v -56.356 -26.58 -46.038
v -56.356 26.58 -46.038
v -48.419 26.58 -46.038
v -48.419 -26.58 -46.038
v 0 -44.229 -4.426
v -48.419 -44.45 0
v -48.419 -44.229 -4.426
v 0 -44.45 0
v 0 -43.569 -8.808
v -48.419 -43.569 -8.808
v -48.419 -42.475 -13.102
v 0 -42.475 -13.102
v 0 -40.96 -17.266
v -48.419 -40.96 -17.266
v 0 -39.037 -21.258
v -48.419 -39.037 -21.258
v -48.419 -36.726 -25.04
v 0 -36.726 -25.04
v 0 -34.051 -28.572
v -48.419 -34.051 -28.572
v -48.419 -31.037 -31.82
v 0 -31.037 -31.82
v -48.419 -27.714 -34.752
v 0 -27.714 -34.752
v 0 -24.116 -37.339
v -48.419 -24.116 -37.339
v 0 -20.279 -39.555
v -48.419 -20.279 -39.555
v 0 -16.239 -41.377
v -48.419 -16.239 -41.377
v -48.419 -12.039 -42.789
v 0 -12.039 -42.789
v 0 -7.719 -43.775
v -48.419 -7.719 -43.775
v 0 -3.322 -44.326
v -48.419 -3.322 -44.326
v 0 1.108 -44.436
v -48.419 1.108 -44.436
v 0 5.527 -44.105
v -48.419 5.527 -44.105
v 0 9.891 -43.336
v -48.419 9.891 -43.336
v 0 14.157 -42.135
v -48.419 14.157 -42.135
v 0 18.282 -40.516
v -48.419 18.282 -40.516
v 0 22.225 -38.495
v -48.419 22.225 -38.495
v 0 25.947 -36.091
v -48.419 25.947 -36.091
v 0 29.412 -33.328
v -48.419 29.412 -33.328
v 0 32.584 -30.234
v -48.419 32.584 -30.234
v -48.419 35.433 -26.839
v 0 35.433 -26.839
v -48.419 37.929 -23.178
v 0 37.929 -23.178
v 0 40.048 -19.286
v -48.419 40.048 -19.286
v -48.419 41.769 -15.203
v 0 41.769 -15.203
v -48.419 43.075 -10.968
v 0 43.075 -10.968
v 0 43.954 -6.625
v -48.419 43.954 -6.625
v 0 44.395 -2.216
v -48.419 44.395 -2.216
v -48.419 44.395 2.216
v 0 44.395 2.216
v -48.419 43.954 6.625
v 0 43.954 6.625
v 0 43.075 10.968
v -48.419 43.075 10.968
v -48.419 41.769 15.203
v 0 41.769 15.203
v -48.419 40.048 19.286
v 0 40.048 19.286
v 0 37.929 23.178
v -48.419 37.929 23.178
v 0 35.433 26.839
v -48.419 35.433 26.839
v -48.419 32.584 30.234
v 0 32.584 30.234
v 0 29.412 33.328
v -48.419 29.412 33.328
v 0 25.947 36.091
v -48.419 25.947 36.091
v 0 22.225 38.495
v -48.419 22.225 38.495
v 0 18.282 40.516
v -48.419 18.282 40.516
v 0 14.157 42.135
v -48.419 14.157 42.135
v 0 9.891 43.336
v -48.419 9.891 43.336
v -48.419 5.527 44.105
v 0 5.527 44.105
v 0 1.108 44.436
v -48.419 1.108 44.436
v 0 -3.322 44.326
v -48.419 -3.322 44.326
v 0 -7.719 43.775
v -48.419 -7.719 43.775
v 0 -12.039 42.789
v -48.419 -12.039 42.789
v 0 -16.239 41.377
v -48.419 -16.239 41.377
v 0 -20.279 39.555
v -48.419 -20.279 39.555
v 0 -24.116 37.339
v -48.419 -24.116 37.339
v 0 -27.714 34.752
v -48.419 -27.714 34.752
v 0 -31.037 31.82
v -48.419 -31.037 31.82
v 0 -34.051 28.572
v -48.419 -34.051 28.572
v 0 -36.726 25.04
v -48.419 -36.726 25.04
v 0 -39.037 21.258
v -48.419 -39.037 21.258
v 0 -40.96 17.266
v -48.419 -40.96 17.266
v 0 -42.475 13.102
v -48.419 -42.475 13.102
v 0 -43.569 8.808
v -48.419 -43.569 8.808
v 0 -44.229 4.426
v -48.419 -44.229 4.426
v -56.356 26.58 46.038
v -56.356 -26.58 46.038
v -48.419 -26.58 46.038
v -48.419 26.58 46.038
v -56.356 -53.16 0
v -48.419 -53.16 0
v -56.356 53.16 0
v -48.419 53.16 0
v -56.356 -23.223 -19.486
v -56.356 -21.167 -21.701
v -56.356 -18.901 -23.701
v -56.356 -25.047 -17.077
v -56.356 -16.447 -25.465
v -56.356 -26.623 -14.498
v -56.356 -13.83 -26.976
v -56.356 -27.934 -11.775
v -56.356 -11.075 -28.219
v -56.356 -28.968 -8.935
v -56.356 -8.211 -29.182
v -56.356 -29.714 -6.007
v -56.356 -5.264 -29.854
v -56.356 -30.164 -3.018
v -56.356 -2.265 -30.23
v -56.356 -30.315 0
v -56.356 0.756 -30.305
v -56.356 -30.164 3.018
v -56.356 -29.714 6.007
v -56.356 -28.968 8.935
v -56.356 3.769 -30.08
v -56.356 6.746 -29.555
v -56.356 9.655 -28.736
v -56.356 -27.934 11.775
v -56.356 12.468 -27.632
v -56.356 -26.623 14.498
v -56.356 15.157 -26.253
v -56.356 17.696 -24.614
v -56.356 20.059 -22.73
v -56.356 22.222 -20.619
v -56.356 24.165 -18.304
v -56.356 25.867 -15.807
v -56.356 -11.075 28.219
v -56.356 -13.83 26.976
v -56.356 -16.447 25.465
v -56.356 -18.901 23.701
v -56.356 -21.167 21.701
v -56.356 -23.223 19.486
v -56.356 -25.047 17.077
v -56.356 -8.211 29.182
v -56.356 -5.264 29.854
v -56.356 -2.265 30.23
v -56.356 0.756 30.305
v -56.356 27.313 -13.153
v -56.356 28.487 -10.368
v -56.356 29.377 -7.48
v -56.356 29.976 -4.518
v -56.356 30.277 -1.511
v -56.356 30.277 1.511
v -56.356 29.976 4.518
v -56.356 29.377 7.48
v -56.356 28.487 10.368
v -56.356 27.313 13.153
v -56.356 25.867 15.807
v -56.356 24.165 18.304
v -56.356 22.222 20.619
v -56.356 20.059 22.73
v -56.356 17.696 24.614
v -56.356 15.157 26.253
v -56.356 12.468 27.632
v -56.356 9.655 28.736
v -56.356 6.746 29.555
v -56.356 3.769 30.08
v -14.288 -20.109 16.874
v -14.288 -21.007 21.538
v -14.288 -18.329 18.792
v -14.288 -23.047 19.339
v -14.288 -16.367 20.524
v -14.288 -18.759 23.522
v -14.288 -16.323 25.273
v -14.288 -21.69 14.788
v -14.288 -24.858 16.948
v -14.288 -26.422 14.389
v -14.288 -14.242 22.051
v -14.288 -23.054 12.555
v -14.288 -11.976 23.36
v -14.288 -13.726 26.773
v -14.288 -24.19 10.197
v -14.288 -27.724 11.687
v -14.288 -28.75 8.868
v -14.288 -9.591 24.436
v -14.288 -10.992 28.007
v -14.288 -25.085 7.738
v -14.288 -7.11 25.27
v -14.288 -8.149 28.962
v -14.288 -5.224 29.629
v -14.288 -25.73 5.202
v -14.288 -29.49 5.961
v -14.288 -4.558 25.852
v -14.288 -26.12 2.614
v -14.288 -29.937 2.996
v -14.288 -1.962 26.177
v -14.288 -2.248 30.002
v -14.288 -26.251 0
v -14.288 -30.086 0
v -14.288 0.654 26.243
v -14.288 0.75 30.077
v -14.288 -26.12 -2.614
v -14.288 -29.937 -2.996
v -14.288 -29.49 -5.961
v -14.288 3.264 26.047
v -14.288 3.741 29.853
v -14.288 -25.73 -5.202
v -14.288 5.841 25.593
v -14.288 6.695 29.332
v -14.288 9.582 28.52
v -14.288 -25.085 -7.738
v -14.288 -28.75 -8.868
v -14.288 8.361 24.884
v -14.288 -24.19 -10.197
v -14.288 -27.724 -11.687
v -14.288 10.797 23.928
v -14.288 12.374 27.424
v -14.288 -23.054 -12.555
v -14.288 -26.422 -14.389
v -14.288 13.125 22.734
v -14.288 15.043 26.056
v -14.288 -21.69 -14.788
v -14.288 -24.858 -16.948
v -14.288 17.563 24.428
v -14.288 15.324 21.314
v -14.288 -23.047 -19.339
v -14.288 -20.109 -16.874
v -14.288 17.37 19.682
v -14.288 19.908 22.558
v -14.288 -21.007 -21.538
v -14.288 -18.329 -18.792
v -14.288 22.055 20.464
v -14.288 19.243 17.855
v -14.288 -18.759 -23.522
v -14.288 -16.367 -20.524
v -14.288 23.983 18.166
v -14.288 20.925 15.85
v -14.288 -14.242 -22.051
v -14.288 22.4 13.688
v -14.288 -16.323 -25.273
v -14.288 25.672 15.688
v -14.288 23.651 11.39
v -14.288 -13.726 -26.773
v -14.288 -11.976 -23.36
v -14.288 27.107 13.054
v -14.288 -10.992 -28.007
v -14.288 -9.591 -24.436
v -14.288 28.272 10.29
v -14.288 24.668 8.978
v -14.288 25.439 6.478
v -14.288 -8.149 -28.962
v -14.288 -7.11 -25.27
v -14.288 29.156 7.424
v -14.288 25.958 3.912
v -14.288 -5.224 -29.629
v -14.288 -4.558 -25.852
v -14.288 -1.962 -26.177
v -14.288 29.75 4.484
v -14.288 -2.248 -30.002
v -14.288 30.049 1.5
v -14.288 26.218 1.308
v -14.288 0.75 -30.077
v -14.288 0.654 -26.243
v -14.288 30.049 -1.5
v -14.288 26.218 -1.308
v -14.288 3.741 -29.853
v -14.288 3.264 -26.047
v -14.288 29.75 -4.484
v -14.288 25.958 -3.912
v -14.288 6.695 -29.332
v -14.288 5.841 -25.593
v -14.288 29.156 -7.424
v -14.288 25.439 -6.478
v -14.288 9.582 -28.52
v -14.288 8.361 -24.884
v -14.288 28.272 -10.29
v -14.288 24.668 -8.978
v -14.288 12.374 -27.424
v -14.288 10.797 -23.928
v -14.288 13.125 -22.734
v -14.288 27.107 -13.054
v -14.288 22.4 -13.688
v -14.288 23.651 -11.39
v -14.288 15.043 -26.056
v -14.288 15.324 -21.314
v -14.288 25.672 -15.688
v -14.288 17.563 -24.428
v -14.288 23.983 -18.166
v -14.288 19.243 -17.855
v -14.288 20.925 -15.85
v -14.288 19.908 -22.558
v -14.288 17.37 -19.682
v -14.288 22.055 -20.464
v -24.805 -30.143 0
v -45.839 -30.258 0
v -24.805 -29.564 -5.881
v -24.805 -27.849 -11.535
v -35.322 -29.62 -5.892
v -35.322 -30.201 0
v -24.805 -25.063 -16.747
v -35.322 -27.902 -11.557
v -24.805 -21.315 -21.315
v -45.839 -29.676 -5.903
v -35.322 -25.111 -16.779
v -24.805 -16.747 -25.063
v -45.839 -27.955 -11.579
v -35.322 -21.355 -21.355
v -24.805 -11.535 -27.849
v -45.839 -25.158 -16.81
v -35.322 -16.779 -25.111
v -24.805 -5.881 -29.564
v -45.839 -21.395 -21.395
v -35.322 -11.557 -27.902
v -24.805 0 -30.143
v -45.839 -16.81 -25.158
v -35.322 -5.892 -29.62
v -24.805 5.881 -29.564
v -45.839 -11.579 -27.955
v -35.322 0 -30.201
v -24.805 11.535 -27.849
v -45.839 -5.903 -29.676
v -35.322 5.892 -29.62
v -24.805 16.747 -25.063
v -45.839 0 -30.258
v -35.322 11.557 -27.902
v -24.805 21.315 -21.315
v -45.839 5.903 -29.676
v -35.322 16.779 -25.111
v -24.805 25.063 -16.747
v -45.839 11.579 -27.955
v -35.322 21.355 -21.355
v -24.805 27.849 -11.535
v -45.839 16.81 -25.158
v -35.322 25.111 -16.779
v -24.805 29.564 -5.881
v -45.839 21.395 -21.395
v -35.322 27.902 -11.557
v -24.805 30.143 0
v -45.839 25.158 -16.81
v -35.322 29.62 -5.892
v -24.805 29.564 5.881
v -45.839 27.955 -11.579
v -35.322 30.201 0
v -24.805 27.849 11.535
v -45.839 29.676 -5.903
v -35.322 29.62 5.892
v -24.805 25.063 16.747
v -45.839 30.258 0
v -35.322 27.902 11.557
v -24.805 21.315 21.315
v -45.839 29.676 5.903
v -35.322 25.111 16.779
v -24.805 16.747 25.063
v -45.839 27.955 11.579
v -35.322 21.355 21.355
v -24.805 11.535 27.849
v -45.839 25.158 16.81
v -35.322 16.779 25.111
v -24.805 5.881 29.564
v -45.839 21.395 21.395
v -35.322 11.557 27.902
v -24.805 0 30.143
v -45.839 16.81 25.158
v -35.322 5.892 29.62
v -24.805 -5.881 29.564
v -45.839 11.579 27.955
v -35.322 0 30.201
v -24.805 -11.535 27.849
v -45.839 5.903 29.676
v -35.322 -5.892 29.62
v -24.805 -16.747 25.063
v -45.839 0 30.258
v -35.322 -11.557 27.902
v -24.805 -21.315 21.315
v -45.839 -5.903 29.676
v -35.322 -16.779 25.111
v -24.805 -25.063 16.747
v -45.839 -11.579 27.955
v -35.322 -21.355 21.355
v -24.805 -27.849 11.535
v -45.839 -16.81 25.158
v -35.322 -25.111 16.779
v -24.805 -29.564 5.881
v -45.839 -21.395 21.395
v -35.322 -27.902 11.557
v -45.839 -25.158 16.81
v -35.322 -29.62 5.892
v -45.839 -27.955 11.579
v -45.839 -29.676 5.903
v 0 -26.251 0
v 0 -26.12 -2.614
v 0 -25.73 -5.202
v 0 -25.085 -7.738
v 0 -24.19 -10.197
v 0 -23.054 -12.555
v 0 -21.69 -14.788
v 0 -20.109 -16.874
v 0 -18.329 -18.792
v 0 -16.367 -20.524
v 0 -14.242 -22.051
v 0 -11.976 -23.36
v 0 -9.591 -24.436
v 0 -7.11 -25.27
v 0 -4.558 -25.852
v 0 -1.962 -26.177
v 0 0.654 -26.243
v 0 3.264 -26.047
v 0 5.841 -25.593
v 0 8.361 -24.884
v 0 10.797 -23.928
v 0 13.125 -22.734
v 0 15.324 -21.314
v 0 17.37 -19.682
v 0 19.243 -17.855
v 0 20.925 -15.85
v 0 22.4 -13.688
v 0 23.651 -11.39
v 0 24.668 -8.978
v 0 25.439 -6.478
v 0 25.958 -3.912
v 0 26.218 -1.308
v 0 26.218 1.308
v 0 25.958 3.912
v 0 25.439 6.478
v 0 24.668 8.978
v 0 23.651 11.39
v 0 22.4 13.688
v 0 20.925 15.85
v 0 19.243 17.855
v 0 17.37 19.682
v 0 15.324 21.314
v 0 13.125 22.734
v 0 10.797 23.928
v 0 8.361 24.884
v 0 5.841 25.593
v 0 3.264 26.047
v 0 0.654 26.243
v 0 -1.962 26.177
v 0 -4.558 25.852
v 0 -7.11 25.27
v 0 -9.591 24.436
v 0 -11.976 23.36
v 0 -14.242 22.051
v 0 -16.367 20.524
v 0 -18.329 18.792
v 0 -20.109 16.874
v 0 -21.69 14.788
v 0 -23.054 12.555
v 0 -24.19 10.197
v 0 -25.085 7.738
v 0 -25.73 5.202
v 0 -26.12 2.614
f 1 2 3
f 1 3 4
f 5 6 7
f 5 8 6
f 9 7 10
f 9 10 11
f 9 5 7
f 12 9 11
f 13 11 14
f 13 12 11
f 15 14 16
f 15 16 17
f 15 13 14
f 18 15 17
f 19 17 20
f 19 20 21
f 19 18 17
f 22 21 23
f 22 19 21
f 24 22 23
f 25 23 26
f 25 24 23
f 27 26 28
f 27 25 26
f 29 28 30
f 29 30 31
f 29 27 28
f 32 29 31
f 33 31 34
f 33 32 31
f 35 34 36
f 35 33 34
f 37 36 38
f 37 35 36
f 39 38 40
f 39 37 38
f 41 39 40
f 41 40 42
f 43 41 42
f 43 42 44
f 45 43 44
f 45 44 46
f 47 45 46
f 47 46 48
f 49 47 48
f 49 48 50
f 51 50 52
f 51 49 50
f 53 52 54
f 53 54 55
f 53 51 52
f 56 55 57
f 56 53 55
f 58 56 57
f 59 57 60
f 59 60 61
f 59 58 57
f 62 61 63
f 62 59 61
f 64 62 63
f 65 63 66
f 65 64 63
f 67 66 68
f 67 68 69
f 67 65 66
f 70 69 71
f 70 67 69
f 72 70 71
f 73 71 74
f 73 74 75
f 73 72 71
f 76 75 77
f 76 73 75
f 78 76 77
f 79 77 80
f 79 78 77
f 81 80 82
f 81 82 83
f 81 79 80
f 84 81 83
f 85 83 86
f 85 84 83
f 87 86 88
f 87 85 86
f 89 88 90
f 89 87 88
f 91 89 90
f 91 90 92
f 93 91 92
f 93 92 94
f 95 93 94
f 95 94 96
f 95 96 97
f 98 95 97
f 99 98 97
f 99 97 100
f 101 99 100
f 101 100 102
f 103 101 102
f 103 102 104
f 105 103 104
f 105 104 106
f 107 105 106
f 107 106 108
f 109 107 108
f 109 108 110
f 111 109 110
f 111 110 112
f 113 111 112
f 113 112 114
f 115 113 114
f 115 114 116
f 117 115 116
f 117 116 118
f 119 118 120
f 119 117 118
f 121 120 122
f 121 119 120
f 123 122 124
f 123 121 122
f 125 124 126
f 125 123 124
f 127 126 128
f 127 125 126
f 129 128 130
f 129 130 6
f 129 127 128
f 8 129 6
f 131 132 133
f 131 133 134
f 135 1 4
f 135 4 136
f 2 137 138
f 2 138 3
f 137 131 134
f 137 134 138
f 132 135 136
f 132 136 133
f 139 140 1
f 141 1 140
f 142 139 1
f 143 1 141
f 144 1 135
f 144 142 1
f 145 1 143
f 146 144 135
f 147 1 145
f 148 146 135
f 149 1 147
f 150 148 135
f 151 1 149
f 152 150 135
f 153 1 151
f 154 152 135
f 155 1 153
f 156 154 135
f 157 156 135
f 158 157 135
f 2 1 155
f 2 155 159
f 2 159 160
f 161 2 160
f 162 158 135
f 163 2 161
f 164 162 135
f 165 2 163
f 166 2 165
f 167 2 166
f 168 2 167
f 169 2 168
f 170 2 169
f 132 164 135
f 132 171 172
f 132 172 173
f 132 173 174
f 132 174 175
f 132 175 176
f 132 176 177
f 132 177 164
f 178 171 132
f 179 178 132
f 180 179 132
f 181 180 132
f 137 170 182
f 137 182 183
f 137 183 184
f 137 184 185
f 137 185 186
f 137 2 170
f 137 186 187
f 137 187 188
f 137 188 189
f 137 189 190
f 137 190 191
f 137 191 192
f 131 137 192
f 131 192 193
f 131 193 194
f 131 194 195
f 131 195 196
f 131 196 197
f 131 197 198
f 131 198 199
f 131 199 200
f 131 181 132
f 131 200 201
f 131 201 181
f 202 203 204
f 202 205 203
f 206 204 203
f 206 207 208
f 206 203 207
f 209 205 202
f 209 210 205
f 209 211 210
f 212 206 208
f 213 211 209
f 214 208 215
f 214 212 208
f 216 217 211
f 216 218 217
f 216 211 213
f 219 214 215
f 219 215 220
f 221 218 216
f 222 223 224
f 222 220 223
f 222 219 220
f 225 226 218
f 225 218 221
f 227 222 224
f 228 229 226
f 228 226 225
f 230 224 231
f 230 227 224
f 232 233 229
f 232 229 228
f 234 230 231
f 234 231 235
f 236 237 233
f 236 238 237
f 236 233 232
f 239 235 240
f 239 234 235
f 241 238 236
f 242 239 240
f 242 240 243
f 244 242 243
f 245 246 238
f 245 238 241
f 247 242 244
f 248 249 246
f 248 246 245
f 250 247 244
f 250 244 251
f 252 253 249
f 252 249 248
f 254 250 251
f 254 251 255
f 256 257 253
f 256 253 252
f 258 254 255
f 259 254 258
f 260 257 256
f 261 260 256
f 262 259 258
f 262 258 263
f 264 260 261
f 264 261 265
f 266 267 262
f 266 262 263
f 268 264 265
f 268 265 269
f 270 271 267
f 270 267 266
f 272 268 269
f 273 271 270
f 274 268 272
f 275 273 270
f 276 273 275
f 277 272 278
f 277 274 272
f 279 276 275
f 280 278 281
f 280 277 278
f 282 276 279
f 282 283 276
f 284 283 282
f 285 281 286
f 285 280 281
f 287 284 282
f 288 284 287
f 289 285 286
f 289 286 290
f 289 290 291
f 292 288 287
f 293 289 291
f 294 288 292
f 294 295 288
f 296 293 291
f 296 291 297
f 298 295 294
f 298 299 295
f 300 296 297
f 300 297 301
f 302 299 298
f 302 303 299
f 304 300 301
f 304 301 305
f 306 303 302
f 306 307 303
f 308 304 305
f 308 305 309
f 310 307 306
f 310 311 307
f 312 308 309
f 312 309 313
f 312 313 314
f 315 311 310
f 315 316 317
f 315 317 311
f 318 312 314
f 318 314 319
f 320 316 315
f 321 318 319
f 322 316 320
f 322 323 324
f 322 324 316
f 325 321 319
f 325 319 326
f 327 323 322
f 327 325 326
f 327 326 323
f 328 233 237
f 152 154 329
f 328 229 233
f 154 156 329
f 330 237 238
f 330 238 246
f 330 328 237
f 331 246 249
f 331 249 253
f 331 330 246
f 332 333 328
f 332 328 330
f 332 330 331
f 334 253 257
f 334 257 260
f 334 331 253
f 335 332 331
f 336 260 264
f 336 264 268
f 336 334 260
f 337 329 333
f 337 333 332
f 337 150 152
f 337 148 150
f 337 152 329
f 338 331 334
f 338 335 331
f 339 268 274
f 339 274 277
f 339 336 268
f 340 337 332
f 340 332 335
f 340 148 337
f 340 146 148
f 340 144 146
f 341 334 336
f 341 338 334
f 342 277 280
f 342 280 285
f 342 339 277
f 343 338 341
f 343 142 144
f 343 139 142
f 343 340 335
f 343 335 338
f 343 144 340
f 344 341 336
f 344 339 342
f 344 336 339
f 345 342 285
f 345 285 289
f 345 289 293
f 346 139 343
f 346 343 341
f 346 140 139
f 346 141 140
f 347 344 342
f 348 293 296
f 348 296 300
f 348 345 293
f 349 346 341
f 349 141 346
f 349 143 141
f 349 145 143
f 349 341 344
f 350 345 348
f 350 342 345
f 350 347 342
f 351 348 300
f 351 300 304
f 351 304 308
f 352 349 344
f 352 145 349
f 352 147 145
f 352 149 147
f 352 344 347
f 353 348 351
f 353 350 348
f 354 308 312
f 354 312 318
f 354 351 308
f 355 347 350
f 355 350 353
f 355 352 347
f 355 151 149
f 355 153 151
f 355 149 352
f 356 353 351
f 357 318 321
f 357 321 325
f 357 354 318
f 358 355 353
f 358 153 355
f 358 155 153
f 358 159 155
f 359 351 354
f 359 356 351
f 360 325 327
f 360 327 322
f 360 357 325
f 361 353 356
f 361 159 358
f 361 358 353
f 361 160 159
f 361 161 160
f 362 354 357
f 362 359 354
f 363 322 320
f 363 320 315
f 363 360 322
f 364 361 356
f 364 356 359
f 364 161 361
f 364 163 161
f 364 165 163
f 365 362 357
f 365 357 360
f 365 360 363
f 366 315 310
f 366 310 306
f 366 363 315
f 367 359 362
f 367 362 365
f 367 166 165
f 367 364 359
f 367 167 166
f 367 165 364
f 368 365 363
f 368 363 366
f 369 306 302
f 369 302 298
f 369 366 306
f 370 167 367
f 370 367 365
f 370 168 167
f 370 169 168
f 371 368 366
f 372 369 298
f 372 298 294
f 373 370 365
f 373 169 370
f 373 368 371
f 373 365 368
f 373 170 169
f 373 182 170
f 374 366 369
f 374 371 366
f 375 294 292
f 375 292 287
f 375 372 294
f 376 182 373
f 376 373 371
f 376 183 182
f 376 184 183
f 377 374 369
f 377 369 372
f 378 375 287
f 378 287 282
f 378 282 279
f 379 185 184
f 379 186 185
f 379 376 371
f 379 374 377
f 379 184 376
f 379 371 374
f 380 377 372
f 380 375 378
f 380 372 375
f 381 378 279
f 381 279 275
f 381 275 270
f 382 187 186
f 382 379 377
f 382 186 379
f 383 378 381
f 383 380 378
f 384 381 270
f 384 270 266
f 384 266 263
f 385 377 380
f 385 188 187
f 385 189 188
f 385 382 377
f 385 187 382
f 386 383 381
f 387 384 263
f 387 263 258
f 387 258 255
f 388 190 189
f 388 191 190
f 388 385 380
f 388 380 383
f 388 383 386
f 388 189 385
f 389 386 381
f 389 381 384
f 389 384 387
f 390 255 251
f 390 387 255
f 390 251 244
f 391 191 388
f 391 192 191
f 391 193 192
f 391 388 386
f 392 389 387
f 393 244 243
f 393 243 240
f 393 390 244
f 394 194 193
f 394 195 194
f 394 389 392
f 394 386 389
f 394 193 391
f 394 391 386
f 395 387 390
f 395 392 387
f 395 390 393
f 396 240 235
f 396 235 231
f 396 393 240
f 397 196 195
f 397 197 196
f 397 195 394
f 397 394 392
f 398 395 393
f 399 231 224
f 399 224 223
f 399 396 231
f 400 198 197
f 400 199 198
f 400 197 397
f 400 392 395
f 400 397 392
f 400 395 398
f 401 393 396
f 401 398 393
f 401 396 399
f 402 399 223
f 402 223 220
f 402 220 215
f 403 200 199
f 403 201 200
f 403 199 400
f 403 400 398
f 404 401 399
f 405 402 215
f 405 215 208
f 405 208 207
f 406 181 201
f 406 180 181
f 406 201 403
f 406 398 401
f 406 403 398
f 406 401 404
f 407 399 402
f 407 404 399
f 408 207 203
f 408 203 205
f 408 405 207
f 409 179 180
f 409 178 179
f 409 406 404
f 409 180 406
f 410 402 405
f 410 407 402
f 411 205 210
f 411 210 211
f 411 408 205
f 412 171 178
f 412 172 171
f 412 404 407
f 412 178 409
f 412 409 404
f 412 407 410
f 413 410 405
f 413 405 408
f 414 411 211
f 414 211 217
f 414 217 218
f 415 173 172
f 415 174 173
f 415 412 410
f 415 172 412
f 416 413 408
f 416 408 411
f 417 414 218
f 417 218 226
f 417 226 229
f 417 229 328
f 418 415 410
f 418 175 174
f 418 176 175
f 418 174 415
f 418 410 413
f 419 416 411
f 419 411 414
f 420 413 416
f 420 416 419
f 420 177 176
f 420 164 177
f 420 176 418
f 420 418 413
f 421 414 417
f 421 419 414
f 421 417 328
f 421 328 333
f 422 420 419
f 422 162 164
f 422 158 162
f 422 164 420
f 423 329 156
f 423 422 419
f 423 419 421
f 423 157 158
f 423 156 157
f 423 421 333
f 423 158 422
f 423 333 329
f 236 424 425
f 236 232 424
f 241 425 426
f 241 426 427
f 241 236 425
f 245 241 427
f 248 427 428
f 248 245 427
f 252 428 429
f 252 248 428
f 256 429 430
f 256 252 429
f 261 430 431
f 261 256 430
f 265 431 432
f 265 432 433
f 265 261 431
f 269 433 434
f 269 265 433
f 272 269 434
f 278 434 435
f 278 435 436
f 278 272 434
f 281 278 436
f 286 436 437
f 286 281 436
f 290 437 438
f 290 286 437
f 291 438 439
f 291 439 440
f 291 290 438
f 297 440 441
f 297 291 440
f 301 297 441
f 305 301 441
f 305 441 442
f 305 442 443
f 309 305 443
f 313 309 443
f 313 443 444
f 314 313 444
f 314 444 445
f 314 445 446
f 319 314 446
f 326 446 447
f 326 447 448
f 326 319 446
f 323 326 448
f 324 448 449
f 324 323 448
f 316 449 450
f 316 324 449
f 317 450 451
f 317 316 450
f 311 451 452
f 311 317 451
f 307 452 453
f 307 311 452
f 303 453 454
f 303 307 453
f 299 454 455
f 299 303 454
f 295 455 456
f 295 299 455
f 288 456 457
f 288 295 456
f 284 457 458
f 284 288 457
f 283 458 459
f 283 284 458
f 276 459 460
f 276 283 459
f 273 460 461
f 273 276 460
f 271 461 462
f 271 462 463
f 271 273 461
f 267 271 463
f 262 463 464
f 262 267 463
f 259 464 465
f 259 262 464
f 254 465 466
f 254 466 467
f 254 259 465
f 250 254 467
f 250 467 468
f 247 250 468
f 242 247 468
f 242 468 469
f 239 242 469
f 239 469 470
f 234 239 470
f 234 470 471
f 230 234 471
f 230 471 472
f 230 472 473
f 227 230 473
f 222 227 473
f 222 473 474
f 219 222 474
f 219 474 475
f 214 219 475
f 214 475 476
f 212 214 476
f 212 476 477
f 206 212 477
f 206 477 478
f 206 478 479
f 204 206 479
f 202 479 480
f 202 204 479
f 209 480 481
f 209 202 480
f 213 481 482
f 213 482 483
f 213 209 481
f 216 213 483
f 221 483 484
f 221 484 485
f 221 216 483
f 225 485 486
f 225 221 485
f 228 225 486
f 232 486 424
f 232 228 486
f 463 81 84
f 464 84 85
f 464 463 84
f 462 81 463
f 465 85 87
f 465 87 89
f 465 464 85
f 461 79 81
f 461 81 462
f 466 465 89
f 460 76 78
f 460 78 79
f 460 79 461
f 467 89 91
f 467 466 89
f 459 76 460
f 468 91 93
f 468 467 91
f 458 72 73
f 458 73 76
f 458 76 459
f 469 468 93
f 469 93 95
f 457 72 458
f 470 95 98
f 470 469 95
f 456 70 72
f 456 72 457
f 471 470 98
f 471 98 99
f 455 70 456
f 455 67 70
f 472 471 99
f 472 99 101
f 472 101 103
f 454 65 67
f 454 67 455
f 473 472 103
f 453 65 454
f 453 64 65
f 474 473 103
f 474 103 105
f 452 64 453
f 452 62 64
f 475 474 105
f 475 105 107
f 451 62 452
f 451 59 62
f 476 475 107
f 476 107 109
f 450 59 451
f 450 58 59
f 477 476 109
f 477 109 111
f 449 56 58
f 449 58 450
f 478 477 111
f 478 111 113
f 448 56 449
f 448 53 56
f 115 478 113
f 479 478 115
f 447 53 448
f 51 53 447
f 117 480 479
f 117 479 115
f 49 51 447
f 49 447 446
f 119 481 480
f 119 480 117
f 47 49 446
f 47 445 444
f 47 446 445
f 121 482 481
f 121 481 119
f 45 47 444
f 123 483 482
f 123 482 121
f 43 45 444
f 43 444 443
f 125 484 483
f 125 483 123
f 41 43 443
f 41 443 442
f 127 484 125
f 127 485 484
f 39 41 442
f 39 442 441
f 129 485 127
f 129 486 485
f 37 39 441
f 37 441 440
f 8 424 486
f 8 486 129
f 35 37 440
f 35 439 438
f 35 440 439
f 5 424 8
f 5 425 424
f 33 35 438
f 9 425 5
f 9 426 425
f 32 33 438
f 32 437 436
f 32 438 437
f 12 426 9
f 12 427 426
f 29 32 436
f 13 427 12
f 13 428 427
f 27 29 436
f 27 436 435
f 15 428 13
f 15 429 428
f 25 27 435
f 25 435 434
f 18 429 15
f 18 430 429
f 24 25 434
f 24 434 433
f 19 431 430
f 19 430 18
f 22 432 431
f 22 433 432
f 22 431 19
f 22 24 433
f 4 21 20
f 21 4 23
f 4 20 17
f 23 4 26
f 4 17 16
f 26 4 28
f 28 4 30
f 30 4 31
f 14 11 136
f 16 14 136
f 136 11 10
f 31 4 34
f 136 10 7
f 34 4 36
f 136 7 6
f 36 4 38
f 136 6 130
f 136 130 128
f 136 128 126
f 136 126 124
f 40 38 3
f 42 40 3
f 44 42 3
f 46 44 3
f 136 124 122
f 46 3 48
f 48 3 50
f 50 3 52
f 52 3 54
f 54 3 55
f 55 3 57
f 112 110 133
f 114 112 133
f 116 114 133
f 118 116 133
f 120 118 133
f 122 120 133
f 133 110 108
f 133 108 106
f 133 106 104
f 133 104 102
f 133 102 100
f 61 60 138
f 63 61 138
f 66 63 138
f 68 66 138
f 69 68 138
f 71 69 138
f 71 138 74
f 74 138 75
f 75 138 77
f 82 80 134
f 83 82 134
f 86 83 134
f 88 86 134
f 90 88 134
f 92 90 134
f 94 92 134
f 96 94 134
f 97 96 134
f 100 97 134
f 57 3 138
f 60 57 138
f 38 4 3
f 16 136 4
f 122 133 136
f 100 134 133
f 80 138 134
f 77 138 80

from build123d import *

# Parameters (mm, degrees)
SKETCH2_R           = 30.3149
BOSS_EXTRUDE1_DEPTH = 7.9375


with BuildPart() as part:
    # Sketch1 → Revolve1 (revolve)
    with BuildSketch(Plane.XY):
        Polygon((-56.35625, -44.45), (0, -44.45), (0, -26.2509), (-14.2875, -26.2509), (-14.2875, -30.0863), (-56.35625, -30.3149), align=None)
    revolve(axis=Axis((-56.35625, 0, 0), (1, 0, 0)))

    # Sketch2 → Boss-Extrude1 (add)
    with BuildSketch(Plane.ZY.offset(56.35625)):
        Polygon((0, 53.159526036), (-46.0375, 26.579763018), (-46.0375, -26.579763018), (0, -53.159526036), (46.0375, -26.579763018), (46.0375, 26.579763018), align=None)
        Circle(SKETCH2_R, mode=Mode.SUBTRACT)
    extrude(amount=-BOSS_EXTRUDE1_DEPTH)


solid = part.part
